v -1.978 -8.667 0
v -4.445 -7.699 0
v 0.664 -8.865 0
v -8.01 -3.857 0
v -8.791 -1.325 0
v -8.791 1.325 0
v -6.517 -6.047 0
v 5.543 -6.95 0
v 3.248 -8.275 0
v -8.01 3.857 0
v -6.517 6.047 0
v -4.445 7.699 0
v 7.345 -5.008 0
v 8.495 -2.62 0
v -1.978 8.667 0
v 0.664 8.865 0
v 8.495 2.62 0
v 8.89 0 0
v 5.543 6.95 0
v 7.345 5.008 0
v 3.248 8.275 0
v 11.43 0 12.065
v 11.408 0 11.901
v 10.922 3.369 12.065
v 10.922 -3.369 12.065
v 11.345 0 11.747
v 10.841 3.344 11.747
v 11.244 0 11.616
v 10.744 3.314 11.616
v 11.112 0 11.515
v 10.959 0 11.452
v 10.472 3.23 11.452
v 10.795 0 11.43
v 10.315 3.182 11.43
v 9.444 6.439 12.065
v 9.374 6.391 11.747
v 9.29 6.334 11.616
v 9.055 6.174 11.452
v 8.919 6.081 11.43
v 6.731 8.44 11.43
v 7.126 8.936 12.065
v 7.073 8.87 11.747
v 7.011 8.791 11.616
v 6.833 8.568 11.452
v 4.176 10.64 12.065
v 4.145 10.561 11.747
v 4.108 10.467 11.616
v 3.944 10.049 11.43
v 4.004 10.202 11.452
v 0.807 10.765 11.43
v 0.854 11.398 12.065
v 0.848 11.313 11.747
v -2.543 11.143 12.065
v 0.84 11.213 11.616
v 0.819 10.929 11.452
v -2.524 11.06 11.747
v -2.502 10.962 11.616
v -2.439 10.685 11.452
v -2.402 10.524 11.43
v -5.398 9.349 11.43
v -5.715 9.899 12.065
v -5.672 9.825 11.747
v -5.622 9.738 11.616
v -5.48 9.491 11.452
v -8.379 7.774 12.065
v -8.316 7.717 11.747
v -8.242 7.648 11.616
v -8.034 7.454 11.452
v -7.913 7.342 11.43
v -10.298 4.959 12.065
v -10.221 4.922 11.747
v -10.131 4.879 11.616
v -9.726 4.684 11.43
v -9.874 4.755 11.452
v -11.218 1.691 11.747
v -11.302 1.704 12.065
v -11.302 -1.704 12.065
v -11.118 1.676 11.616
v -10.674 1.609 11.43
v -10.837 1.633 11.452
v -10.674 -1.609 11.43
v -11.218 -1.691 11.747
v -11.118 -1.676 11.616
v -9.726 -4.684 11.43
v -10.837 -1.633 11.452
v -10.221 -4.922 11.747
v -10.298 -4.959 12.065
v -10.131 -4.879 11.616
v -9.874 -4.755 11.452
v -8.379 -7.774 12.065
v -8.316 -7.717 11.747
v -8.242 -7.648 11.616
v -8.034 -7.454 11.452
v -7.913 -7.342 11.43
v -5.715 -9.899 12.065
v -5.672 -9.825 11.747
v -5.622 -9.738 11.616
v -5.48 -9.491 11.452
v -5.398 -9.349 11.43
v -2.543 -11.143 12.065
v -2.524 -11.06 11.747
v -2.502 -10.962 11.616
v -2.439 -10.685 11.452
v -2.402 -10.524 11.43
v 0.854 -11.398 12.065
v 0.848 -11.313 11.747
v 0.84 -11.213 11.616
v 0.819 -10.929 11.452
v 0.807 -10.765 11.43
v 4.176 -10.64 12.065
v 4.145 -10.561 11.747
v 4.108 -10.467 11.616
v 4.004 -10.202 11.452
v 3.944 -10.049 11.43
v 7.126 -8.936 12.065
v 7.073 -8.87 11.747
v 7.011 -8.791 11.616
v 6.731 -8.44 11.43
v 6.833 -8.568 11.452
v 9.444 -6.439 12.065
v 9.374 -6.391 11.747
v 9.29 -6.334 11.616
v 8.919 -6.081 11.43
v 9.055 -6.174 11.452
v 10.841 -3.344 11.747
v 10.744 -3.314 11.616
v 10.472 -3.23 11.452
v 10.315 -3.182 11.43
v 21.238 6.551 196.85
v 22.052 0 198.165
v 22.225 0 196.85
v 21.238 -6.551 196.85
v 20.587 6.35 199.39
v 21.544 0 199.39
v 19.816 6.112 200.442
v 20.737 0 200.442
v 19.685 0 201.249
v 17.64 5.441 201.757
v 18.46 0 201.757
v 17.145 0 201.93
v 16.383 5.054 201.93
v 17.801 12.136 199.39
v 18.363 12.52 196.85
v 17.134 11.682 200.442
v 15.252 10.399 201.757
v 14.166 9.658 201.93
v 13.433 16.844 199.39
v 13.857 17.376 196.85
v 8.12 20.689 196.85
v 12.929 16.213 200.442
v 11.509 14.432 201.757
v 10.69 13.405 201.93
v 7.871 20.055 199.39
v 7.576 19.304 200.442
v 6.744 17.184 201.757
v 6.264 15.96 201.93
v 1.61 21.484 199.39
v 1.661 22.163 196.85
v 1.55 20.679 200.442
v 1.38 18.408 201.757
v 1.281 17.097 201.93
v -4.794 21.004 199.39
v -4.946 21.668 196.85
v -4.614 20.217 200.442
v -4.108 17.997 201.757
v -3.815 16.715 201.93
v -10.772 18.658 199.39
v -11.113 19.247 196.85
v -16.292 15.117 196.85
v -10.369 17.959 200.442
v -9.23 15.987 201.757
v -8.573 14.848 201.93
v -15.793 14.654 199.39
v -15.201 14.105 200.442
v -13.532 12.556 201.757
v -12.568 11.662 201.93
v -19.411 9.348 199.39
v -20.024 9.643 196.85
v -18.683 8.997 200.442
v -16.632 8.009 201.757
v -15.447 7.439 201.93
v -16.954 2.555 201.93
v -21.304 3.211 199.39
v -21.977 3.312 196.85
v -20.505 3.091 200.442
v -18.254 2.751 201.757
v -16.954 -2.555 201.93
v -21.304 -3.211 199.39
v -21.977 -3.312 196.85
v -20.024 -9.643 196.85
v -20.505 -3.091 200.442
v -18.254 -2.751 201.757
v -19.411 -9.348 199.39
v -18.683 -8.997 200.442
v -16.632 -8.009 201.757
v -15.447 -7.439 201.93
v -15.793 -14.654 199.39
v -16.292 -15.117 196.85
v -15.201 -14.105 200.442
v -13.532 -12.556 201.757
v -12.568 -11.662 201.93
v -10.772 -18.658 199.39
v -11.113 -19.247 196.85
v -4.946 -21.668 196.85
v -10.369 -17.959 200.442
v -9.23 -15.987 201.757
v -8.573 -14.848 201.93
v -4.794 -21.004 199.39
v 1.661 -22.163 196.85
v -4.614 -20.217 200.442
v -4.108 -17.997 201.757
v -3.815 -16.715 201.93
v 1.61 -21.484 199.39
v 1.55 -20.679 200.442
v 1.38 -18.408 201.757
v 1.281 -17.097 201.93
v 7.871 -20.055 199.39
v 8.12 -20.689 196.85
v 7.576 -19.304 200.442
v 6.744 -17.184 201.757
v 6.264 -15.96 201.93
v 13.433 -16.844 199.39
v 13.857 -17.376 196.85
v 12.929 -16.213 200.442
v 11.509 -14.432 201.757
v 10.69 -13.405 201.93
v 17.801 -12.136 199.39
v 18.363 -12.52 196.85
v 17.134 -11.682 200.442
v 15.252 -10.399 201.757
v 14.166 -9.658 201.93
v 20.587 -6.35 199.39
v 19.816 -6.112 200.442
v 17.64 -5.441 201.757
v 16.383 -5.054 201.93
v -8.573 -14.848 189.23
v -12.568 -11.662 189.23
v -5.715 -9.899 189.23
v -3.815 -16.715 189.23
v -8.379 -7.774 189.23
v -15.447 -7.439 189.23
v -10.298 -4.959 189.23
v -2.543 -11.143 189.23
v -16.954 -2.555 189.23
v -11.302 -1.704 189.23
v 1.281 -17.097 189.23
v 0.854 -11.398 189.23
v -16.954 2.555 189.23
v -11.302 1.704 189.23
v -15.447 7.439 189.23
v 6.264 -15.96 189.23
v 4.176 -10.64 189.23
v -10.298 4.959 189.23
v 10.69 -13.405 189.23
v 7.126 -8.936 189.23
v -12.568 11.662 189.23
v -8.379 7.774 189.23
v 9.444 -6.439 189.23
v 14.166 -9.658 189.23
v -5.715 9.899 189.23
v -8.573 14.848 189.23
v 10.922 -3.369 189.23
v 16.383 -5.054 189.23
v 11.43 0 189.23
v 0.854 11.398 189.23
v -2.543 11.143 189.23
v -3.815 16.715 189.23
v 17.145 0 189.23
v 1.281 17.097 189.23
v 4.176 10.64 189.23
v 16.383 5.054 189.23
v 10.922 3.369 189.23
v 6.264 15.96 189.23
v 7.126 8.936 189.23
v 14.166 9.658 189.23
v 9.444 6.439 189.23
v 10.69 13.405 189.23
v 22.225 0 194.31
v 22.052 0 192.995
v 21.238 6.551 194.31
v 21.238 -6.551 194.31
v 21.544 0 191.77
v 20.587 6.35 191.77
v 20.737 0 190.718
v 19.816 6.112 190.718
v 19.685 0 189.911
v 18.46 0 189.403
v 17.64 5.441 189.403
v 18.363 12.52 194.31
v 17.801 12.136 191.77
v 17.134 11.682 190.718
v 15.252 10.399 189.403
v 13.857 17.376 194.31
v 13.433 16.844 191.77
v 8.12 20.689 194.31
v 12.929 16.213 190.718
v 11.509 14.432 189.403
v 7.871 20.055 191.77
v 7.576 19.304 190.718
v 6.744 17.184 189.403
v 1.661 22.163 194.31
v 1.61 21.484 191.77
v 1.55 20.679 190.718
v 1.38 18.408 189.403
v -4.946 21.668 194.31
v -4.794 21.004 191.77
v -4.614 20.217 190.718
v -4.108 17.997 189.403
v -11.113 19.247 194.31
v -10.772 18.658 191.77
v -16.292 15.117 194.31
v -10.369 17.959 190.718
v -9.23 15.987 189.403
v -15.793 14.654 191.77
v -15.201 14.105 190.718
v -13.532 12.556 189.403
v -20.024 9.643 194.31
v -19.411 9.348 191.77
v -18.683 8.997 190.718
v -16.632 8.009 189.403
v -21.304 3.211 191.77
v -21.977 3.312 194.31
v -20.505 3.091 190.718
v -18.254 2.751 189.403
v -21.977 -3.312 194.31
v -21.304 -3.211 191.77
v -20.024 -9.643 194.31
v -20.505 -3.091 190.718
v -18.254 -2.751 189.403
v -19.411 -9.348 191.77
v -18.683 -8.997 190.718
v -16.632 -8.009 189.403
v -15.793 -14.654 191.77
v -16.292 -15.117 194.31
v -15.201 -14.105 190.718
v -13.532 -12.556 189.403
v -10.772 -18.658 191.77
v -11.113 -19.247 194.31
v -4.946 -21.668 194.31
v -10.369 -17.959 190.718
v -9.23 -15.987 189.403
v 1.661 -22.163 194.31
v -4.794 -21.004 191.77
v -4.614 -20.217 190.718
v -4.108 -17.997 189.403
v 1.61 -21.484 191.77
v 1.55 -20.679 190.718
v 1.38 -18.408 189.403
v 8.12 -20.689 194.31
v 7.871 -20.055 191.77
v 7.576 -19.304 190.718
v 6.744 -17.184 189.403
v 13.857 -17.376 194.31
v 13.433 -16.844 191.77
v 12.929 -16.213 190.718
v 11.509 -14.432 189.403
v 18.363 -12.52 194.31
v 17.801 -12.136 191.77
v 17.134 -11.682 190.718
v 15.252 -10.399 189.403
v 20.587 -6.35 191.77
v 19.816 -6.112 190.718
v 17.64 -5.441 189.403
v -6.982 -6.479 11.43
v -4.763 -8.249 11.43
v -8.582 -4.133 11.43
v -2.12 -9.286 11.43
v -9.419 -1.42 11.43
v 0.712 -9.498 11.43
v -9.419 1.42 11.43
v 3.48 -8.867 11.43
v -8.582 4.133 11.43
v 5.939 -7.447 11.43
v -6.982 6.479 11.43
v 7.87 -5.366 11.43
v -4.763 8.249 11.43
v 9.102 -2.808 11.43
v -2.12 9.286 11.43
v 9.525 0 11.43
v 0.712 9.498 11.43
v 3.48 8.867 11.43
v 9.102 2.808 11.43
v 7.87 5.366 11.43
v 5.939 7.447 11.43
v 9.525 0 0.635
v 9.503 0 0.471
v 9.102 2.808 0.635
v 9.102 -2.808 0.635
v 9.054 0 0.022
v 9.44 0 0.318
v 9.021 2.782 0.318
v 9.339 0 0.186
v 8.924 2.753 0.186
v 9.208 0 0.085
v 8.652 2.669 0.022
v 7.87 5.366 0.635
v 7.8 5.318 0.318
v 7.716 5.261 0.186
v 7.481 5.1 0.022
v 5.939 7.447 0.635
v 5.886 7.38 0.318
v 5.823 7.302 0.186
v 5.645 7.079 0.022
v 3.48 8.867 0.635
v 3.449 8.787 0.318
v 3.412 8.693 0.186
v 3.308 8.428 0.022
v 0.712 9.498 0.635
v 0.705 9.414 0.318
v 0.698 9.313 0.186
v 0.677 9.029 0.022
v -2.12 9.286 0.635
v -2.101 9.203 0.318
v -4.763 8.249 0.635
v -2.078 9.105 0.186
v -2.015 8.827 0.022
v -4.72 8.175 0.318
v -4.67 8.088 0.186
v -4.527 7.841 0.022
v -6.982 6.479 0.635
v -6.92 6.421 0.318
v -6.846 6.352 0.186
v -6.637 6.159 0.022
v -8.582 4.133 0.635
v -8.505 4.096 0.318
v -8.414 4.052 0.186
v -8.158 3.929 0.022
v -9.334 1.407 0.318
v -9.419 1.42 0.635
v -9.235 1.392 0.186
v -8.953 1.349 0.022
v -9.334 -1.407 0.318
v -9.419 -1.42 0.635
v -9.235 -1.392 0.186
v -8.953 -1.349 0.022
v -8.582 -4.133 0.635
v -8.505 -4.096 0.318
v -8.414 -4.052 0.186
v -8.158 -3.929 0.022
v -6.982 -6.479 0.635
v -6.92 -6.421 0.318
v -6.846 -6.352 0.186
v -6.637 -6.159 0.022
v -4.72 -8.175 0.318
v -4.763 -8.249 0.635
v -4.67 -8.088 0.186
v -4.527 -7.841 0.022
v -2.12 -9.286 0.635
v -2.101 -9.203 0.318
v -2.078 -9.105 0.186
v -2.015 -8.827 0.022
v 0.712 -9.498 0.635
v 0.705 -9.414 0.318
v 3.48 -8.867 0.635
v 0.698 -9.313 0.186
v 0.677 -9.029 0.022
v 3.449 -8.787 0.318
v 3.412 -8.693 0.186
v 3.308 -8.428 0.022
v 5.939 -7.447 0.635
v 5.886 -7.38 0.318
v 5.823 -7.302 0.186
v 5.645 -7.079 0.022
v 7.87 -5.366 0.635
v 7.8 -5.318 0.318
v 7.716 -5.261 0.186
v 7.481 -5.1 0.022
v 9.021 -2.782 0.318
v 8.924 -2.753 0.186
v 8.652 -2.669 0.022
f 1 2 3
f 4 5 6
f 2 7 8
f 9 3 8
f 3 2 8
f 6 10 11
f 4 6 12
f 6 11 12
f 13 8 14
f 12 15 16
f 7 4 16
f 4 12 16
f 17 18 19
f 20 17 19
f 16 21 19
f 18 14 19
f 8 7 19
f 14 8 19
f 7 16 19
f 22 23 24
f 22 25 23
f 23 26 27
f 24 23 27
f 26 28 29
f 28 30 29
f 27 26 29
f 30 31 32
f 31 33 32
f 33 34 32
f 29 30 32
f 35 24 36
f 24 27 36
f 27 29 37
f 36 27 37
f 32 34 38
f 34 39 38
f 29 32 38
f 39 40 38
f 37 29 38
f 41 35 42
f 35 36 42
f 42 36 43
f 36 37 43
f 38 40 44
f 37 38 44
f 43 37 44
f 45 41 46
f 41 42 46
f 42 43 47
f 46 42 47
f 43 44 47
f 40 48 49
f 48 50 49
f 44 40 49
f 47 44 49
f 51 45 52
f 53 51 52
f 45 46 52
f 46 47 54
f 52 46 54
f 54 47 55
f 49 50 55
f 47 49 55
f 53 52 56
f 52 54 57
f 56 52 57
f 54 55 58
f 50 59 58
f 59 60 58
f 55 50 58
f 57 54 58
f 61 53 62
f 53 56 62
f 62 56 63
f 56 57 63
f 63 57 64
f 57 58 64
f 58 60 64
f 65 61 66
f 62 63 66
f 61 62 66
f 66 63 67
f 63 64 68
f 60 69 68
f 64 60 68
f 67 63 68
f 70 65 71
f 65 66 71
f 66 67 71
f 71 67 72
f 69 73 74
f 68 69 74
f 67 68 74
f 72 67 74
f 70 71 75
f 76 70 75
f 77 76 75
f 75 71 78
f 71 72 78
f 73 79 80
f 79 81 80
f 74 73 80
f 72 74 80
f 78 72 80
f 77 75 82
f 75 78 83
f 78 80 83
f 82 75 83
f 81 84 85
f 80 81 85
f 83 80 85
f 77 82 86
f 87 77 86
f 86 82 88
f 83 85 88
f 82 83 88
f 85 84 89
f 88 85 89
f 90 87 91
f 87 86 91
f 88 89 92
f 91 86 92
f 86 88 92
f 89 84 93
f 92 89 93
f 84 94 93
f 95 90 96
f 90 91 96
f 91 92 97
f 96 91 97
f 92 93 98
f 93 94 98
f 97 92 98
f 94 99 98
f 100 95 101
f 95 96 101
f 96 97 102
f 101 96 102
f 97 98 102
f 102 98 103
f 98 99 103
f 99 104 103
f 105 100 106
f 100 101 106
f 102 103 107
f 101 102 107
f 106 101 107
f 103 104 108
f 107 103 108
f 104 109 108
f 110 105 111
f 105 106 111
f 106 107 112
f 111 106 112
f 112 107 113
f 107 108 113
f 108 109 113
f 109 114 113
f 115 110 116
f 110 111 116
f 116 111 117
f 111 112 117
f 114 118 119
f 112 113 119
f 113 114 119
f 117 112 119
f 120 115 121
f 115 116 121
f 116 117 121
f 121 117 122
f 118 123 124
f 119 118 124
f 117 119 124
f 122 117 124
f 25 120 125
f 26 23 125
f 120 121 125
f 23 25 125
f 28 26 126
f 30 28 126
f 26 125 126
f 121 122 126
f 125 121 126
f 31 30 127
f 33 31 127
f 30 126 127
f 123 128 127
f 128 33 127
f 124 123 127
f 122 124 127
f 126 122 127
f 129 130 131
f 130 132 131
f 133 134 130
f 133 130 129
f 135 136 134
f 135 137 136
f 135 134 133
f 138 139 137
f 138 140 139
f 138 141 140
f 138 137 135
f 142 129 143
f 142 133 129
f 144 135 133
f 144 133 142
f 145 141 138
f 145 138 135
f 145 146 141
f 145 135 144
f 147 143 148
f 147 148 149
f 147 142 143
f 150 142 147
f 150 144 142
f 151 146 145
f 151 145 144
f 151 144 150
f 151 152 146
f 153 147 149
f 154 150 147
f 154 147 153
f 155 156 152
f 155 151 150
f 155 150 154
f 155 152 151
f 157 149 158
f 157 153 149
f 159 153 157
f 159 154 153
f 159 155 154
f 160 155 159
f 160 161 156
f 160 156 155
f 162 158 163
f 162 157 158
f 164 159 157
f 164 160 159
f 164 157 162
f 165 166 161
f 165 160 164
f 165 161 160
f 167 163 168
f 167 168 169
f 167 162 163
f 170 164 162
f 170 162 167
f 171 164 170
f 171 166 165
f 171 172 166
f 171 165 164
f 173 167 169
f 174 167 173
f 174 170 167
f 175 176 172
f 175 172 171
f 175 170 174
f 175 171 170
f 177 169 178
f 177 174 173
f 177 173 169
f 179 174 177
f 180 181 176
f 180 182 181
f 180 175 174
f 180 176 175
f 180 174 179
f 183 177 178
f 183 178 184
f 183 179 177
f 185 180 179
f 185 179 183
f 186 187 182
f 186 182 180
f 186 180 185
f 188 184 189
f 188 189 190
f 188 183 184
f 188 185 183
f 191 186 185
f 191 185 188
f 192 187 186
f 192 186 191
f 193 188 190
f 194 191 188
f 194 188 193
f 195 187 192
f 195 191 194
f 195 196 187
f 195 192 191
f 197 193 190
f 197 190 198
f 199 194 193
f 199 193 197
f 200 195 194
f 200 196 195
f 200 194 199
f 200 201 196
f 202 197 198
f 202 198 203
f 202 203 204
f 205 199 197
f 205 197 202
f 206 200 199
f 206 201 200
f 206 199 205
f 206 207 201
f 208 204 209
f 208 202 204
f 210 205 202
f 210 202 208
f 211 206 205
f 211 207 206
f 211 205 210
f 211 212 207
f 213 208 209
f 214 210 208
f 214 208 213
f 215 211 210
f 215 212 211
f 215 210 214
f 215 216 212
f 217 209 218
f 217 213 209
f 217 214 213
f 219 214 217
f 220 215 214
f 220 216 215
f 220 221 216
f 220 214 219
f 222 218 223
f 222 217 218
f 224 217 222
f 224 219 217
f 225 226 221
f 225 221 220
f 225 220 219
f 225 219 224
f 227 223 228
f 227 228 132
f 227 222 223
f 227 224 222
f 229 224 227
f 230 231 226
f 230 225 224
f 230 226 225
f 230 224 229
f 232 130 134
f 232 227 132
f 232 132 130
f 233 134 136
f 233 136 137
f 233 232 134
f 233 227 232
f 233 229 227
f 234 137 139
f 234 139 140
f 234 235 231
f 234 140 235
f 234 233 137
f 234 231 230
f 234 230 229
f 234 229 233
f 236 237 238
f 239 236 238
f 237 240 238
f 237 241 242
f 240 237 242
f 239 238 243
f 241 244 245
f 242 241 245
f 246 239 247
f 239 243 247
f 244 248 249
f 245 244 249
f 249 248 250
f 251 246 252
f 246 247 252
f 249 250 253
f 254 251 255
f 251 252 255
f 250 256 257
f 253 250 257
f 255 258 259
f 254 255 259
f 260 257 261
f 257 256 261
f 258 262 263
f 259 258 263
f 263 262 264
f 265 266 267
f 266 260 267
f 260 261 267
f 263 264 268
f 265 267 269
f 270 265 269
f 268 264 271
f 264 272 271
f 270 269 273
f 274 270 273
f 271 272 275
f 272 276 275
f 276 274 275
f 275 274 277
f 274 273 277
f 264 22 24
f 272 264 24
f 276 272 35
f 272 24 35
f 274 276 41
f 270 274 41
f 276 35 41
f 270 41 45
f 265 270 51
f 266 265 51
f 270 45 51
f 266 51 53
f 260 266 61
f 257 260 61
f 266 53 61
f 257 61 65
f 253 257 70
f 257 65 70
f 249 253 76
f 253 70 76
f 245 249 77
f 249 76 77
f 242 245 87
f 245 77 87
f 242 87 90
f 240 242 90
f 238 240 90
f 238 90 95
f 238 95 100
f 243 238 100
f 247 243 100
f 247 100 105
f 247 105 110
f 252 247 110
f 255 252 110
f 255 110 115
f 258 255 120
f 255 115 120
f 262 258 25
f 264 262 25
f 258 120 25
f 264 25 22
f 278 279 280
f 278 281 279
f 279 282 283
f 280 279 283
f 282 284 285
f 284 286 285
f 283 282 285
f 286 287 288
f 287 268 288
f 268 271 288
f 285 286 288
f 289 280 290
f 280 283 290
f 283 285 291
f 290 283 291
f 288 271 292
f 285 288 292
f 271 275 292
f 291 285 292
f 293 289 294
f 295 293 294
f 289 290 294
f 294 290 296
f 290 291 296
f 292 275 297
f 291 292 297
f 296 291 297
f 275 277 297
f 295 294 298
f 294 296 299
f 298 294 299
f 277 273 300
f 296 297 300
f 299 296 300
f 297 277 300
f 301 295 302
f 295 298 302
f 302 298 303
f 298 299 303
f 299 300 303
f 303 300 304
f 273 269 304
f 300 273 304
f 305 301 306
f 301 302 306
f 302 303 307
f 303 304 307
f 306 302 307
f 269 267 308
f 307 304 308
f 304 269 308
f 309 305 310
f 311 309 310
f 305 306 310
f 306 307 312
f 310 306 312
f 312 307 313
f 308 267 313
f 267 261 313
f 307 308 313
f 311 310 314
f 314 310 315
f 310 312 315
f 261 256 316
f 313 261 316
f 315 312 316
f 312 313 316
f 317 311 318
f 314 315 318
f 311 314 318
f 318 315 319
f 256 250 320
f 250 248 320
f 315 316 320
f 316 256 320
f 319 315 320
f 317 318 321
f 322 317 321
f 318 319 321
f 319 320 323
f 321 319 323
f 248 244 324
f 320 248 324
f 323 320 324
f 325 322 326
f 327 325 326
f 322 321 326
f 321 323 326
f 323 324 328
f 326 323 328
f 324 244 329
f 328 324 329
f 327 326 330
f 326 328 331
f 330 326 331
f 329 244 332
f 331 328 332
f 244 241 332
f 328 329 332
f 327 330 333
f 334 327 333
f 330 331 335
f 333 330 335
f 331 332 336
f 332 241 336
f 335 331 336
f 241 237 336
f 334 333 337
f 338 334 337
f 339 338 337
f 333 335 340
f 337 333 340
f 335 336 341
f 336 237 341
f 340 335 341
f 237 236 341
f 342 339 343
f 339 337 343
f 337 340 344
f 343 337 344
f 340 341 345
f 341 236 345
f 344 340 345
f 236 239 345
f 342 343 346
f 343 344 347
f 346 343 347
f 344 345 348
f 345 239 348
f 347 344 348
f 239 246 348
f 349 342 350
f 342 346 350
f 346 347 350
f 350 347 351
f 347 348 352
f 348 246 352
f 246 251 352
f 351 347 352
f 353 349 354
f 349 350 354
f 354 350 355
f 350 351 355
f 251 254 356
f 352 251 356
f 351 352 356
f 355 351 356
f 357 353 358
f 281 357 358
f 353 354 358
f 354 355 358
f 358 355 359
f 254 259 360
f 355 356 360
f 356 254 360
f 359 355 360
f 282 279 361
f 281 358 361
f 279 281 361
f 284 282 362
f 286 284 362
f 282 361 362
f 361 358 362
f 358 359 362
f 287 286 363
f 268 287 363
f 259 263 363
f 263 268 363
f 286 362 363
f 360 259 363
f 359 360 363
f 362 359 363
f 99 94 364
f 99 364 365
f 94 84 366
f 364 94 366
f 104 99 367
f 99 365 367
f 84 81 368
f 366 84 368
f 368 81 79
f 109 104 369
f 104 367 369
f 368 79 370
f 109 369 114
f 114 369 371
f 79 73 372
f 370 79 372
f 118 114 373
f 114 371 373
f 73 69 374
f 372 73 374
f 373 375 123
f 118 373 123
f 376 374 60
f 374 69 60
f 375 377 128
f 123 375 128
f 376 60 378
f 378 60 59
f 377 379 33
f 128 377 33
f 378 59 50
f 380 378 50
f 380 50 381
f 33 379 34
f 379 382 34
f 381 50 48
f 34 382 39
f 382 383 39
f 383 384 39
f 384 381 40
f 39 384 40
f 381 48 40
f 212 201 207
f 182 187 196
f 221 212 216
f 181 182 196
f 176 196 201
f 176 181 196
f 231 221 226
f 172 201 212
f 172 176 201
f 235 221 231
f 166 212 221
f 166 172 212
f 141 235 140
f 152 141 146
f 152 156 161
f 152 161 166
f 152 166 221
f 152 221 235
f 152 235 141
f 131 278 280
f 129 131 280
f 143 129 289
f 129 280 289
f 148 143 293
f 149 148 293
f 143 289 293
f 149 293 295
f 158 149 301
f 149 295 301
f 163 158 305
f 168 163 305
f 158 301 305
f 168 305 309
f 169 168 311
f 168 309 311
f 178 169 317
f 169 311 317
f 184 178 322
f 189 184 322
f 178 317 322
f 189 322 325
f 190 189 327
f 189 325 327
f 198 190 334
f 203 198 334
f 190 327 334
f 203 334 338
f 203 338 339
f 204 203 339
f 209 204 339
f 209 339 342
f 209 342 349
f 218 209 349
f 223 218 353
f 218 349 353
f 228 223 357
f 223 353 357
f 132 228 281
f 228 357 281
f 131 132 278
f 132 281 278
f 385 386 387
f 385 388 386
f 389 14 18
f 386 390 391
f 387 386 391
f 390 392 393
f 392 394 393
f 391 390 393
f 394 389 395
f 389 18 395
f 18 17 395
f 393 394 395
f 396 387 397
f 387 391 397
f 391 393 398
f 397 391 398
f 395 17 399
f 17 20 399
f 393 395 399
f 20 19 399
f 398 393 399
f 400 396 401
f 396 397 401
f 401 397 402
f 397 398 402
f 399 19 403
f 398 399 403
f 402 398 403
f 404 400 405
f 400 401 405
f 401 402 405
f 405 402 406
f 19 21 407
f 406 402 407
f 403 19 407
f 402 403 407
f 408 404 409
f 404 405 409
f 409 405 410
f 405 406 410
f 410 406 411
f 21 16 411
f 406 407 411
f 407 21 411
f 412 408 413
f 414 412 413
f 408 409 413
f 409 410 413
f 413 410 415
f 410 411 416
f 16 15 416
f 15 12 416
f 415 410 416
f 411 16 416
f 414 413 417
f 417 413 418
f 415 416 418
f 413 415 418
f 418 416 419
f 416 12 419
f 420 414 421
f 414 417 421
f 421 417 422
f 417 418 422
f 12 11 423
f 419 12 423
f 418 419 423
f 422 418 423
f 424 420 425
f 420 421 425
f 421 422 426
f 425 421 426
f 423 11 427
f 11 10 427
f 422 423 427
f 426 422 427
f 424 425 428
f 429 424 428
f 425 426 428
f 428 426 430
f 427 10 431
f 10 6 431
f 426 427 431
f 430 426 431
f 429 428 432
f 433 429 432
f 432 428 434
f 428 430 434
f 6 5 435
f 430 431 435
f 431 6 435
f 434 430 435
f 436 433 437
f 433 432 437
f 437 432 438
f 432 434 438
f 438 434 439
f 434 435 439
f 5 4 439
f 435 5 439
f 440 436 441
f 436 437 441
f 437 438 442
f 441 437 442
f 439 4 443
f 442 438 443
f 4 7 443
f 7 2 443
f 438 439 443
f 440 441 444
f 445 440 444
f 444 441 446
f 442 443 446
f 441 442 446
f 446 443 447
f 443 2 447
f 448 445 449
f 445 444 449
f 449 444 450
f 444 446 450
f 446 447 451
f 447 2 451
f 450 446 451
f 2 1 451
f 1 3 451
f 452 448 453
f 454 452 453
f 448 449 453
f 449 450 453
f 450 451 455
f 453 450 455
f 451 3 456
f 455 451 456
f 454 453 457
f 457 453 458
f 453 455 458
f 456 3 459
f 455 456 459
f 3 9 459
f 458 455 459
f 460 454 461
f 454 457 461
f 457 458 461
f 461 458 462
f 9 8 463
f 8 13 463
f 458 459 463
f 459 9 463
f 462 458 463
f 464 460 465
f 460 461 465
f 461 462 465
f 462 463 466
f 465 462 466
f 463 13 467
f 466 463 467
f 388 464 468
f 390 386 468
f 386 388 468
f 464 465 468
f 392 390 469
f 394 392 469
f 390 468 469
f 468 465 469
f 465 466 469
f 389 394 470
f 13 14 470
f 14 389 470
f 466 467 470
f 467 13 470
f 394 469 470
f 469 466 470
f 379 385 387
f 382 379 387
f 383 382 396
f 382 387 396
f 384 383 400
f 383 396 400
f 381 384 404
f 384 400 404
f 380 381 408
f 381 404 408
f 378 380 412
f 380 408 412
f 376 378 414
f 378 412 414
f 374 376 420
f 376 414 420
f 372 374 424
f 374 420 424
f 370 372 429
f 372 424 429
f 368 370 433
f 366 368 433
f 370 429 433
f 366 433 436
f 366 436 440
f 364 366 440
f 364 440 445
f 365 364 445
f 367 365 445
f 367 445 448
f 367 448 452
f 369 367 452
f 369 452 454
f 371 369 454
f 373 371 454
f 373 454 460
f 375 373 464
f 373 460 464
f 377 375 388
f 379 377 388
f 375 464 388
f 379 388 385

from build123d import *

# Parameters (mm, degrees)
F0_R     = 9.525
F1_DEPTH = 11.43
F2_R     = 11.43
F3_DEPTH = 177.8
F4_R     = 22.225
F5_DEPTH = 12.7
F6_R     = 5.08
F7_R     = 0.635


with BuildPart() as f1:
    # F0 (on Top) → F1 (new body)
    with BuildSketch(Plane.XY):
        Circle(F0_R)
    extrude(amount=F1_DEPTH)

    # F2 (on face) → F3 (join)
    with BuildSketch(Plane.XY.offset(11.43)):
        Circle(F2_R)
    extrude(amount=F3_DEPTH)

    # F4 (on face) → F5 (join)
    with BuildSketch(Plane.XY.offset(189.23)):
        Circle(F4_R)
    extrude(amount=F5_DEPTH)

    # F6
    f6_edges = [f1.edges().sort_by_distance(p)[0] for p in [
        (-22.225, 0, 201.93),
        (-22.225, 0, 189.23),
    ]]
    fillet(f6_edges, radius=F6_R)

    # F7
    f7_edges = [f1.edges().sort_by_distance(p)[0] for p in [
        (-11.43, 0, 11.43),
        (-9.525, 0, 0),
    ]]
    fillet(f7_edges, radius=F7_R)


solid = f1.part
